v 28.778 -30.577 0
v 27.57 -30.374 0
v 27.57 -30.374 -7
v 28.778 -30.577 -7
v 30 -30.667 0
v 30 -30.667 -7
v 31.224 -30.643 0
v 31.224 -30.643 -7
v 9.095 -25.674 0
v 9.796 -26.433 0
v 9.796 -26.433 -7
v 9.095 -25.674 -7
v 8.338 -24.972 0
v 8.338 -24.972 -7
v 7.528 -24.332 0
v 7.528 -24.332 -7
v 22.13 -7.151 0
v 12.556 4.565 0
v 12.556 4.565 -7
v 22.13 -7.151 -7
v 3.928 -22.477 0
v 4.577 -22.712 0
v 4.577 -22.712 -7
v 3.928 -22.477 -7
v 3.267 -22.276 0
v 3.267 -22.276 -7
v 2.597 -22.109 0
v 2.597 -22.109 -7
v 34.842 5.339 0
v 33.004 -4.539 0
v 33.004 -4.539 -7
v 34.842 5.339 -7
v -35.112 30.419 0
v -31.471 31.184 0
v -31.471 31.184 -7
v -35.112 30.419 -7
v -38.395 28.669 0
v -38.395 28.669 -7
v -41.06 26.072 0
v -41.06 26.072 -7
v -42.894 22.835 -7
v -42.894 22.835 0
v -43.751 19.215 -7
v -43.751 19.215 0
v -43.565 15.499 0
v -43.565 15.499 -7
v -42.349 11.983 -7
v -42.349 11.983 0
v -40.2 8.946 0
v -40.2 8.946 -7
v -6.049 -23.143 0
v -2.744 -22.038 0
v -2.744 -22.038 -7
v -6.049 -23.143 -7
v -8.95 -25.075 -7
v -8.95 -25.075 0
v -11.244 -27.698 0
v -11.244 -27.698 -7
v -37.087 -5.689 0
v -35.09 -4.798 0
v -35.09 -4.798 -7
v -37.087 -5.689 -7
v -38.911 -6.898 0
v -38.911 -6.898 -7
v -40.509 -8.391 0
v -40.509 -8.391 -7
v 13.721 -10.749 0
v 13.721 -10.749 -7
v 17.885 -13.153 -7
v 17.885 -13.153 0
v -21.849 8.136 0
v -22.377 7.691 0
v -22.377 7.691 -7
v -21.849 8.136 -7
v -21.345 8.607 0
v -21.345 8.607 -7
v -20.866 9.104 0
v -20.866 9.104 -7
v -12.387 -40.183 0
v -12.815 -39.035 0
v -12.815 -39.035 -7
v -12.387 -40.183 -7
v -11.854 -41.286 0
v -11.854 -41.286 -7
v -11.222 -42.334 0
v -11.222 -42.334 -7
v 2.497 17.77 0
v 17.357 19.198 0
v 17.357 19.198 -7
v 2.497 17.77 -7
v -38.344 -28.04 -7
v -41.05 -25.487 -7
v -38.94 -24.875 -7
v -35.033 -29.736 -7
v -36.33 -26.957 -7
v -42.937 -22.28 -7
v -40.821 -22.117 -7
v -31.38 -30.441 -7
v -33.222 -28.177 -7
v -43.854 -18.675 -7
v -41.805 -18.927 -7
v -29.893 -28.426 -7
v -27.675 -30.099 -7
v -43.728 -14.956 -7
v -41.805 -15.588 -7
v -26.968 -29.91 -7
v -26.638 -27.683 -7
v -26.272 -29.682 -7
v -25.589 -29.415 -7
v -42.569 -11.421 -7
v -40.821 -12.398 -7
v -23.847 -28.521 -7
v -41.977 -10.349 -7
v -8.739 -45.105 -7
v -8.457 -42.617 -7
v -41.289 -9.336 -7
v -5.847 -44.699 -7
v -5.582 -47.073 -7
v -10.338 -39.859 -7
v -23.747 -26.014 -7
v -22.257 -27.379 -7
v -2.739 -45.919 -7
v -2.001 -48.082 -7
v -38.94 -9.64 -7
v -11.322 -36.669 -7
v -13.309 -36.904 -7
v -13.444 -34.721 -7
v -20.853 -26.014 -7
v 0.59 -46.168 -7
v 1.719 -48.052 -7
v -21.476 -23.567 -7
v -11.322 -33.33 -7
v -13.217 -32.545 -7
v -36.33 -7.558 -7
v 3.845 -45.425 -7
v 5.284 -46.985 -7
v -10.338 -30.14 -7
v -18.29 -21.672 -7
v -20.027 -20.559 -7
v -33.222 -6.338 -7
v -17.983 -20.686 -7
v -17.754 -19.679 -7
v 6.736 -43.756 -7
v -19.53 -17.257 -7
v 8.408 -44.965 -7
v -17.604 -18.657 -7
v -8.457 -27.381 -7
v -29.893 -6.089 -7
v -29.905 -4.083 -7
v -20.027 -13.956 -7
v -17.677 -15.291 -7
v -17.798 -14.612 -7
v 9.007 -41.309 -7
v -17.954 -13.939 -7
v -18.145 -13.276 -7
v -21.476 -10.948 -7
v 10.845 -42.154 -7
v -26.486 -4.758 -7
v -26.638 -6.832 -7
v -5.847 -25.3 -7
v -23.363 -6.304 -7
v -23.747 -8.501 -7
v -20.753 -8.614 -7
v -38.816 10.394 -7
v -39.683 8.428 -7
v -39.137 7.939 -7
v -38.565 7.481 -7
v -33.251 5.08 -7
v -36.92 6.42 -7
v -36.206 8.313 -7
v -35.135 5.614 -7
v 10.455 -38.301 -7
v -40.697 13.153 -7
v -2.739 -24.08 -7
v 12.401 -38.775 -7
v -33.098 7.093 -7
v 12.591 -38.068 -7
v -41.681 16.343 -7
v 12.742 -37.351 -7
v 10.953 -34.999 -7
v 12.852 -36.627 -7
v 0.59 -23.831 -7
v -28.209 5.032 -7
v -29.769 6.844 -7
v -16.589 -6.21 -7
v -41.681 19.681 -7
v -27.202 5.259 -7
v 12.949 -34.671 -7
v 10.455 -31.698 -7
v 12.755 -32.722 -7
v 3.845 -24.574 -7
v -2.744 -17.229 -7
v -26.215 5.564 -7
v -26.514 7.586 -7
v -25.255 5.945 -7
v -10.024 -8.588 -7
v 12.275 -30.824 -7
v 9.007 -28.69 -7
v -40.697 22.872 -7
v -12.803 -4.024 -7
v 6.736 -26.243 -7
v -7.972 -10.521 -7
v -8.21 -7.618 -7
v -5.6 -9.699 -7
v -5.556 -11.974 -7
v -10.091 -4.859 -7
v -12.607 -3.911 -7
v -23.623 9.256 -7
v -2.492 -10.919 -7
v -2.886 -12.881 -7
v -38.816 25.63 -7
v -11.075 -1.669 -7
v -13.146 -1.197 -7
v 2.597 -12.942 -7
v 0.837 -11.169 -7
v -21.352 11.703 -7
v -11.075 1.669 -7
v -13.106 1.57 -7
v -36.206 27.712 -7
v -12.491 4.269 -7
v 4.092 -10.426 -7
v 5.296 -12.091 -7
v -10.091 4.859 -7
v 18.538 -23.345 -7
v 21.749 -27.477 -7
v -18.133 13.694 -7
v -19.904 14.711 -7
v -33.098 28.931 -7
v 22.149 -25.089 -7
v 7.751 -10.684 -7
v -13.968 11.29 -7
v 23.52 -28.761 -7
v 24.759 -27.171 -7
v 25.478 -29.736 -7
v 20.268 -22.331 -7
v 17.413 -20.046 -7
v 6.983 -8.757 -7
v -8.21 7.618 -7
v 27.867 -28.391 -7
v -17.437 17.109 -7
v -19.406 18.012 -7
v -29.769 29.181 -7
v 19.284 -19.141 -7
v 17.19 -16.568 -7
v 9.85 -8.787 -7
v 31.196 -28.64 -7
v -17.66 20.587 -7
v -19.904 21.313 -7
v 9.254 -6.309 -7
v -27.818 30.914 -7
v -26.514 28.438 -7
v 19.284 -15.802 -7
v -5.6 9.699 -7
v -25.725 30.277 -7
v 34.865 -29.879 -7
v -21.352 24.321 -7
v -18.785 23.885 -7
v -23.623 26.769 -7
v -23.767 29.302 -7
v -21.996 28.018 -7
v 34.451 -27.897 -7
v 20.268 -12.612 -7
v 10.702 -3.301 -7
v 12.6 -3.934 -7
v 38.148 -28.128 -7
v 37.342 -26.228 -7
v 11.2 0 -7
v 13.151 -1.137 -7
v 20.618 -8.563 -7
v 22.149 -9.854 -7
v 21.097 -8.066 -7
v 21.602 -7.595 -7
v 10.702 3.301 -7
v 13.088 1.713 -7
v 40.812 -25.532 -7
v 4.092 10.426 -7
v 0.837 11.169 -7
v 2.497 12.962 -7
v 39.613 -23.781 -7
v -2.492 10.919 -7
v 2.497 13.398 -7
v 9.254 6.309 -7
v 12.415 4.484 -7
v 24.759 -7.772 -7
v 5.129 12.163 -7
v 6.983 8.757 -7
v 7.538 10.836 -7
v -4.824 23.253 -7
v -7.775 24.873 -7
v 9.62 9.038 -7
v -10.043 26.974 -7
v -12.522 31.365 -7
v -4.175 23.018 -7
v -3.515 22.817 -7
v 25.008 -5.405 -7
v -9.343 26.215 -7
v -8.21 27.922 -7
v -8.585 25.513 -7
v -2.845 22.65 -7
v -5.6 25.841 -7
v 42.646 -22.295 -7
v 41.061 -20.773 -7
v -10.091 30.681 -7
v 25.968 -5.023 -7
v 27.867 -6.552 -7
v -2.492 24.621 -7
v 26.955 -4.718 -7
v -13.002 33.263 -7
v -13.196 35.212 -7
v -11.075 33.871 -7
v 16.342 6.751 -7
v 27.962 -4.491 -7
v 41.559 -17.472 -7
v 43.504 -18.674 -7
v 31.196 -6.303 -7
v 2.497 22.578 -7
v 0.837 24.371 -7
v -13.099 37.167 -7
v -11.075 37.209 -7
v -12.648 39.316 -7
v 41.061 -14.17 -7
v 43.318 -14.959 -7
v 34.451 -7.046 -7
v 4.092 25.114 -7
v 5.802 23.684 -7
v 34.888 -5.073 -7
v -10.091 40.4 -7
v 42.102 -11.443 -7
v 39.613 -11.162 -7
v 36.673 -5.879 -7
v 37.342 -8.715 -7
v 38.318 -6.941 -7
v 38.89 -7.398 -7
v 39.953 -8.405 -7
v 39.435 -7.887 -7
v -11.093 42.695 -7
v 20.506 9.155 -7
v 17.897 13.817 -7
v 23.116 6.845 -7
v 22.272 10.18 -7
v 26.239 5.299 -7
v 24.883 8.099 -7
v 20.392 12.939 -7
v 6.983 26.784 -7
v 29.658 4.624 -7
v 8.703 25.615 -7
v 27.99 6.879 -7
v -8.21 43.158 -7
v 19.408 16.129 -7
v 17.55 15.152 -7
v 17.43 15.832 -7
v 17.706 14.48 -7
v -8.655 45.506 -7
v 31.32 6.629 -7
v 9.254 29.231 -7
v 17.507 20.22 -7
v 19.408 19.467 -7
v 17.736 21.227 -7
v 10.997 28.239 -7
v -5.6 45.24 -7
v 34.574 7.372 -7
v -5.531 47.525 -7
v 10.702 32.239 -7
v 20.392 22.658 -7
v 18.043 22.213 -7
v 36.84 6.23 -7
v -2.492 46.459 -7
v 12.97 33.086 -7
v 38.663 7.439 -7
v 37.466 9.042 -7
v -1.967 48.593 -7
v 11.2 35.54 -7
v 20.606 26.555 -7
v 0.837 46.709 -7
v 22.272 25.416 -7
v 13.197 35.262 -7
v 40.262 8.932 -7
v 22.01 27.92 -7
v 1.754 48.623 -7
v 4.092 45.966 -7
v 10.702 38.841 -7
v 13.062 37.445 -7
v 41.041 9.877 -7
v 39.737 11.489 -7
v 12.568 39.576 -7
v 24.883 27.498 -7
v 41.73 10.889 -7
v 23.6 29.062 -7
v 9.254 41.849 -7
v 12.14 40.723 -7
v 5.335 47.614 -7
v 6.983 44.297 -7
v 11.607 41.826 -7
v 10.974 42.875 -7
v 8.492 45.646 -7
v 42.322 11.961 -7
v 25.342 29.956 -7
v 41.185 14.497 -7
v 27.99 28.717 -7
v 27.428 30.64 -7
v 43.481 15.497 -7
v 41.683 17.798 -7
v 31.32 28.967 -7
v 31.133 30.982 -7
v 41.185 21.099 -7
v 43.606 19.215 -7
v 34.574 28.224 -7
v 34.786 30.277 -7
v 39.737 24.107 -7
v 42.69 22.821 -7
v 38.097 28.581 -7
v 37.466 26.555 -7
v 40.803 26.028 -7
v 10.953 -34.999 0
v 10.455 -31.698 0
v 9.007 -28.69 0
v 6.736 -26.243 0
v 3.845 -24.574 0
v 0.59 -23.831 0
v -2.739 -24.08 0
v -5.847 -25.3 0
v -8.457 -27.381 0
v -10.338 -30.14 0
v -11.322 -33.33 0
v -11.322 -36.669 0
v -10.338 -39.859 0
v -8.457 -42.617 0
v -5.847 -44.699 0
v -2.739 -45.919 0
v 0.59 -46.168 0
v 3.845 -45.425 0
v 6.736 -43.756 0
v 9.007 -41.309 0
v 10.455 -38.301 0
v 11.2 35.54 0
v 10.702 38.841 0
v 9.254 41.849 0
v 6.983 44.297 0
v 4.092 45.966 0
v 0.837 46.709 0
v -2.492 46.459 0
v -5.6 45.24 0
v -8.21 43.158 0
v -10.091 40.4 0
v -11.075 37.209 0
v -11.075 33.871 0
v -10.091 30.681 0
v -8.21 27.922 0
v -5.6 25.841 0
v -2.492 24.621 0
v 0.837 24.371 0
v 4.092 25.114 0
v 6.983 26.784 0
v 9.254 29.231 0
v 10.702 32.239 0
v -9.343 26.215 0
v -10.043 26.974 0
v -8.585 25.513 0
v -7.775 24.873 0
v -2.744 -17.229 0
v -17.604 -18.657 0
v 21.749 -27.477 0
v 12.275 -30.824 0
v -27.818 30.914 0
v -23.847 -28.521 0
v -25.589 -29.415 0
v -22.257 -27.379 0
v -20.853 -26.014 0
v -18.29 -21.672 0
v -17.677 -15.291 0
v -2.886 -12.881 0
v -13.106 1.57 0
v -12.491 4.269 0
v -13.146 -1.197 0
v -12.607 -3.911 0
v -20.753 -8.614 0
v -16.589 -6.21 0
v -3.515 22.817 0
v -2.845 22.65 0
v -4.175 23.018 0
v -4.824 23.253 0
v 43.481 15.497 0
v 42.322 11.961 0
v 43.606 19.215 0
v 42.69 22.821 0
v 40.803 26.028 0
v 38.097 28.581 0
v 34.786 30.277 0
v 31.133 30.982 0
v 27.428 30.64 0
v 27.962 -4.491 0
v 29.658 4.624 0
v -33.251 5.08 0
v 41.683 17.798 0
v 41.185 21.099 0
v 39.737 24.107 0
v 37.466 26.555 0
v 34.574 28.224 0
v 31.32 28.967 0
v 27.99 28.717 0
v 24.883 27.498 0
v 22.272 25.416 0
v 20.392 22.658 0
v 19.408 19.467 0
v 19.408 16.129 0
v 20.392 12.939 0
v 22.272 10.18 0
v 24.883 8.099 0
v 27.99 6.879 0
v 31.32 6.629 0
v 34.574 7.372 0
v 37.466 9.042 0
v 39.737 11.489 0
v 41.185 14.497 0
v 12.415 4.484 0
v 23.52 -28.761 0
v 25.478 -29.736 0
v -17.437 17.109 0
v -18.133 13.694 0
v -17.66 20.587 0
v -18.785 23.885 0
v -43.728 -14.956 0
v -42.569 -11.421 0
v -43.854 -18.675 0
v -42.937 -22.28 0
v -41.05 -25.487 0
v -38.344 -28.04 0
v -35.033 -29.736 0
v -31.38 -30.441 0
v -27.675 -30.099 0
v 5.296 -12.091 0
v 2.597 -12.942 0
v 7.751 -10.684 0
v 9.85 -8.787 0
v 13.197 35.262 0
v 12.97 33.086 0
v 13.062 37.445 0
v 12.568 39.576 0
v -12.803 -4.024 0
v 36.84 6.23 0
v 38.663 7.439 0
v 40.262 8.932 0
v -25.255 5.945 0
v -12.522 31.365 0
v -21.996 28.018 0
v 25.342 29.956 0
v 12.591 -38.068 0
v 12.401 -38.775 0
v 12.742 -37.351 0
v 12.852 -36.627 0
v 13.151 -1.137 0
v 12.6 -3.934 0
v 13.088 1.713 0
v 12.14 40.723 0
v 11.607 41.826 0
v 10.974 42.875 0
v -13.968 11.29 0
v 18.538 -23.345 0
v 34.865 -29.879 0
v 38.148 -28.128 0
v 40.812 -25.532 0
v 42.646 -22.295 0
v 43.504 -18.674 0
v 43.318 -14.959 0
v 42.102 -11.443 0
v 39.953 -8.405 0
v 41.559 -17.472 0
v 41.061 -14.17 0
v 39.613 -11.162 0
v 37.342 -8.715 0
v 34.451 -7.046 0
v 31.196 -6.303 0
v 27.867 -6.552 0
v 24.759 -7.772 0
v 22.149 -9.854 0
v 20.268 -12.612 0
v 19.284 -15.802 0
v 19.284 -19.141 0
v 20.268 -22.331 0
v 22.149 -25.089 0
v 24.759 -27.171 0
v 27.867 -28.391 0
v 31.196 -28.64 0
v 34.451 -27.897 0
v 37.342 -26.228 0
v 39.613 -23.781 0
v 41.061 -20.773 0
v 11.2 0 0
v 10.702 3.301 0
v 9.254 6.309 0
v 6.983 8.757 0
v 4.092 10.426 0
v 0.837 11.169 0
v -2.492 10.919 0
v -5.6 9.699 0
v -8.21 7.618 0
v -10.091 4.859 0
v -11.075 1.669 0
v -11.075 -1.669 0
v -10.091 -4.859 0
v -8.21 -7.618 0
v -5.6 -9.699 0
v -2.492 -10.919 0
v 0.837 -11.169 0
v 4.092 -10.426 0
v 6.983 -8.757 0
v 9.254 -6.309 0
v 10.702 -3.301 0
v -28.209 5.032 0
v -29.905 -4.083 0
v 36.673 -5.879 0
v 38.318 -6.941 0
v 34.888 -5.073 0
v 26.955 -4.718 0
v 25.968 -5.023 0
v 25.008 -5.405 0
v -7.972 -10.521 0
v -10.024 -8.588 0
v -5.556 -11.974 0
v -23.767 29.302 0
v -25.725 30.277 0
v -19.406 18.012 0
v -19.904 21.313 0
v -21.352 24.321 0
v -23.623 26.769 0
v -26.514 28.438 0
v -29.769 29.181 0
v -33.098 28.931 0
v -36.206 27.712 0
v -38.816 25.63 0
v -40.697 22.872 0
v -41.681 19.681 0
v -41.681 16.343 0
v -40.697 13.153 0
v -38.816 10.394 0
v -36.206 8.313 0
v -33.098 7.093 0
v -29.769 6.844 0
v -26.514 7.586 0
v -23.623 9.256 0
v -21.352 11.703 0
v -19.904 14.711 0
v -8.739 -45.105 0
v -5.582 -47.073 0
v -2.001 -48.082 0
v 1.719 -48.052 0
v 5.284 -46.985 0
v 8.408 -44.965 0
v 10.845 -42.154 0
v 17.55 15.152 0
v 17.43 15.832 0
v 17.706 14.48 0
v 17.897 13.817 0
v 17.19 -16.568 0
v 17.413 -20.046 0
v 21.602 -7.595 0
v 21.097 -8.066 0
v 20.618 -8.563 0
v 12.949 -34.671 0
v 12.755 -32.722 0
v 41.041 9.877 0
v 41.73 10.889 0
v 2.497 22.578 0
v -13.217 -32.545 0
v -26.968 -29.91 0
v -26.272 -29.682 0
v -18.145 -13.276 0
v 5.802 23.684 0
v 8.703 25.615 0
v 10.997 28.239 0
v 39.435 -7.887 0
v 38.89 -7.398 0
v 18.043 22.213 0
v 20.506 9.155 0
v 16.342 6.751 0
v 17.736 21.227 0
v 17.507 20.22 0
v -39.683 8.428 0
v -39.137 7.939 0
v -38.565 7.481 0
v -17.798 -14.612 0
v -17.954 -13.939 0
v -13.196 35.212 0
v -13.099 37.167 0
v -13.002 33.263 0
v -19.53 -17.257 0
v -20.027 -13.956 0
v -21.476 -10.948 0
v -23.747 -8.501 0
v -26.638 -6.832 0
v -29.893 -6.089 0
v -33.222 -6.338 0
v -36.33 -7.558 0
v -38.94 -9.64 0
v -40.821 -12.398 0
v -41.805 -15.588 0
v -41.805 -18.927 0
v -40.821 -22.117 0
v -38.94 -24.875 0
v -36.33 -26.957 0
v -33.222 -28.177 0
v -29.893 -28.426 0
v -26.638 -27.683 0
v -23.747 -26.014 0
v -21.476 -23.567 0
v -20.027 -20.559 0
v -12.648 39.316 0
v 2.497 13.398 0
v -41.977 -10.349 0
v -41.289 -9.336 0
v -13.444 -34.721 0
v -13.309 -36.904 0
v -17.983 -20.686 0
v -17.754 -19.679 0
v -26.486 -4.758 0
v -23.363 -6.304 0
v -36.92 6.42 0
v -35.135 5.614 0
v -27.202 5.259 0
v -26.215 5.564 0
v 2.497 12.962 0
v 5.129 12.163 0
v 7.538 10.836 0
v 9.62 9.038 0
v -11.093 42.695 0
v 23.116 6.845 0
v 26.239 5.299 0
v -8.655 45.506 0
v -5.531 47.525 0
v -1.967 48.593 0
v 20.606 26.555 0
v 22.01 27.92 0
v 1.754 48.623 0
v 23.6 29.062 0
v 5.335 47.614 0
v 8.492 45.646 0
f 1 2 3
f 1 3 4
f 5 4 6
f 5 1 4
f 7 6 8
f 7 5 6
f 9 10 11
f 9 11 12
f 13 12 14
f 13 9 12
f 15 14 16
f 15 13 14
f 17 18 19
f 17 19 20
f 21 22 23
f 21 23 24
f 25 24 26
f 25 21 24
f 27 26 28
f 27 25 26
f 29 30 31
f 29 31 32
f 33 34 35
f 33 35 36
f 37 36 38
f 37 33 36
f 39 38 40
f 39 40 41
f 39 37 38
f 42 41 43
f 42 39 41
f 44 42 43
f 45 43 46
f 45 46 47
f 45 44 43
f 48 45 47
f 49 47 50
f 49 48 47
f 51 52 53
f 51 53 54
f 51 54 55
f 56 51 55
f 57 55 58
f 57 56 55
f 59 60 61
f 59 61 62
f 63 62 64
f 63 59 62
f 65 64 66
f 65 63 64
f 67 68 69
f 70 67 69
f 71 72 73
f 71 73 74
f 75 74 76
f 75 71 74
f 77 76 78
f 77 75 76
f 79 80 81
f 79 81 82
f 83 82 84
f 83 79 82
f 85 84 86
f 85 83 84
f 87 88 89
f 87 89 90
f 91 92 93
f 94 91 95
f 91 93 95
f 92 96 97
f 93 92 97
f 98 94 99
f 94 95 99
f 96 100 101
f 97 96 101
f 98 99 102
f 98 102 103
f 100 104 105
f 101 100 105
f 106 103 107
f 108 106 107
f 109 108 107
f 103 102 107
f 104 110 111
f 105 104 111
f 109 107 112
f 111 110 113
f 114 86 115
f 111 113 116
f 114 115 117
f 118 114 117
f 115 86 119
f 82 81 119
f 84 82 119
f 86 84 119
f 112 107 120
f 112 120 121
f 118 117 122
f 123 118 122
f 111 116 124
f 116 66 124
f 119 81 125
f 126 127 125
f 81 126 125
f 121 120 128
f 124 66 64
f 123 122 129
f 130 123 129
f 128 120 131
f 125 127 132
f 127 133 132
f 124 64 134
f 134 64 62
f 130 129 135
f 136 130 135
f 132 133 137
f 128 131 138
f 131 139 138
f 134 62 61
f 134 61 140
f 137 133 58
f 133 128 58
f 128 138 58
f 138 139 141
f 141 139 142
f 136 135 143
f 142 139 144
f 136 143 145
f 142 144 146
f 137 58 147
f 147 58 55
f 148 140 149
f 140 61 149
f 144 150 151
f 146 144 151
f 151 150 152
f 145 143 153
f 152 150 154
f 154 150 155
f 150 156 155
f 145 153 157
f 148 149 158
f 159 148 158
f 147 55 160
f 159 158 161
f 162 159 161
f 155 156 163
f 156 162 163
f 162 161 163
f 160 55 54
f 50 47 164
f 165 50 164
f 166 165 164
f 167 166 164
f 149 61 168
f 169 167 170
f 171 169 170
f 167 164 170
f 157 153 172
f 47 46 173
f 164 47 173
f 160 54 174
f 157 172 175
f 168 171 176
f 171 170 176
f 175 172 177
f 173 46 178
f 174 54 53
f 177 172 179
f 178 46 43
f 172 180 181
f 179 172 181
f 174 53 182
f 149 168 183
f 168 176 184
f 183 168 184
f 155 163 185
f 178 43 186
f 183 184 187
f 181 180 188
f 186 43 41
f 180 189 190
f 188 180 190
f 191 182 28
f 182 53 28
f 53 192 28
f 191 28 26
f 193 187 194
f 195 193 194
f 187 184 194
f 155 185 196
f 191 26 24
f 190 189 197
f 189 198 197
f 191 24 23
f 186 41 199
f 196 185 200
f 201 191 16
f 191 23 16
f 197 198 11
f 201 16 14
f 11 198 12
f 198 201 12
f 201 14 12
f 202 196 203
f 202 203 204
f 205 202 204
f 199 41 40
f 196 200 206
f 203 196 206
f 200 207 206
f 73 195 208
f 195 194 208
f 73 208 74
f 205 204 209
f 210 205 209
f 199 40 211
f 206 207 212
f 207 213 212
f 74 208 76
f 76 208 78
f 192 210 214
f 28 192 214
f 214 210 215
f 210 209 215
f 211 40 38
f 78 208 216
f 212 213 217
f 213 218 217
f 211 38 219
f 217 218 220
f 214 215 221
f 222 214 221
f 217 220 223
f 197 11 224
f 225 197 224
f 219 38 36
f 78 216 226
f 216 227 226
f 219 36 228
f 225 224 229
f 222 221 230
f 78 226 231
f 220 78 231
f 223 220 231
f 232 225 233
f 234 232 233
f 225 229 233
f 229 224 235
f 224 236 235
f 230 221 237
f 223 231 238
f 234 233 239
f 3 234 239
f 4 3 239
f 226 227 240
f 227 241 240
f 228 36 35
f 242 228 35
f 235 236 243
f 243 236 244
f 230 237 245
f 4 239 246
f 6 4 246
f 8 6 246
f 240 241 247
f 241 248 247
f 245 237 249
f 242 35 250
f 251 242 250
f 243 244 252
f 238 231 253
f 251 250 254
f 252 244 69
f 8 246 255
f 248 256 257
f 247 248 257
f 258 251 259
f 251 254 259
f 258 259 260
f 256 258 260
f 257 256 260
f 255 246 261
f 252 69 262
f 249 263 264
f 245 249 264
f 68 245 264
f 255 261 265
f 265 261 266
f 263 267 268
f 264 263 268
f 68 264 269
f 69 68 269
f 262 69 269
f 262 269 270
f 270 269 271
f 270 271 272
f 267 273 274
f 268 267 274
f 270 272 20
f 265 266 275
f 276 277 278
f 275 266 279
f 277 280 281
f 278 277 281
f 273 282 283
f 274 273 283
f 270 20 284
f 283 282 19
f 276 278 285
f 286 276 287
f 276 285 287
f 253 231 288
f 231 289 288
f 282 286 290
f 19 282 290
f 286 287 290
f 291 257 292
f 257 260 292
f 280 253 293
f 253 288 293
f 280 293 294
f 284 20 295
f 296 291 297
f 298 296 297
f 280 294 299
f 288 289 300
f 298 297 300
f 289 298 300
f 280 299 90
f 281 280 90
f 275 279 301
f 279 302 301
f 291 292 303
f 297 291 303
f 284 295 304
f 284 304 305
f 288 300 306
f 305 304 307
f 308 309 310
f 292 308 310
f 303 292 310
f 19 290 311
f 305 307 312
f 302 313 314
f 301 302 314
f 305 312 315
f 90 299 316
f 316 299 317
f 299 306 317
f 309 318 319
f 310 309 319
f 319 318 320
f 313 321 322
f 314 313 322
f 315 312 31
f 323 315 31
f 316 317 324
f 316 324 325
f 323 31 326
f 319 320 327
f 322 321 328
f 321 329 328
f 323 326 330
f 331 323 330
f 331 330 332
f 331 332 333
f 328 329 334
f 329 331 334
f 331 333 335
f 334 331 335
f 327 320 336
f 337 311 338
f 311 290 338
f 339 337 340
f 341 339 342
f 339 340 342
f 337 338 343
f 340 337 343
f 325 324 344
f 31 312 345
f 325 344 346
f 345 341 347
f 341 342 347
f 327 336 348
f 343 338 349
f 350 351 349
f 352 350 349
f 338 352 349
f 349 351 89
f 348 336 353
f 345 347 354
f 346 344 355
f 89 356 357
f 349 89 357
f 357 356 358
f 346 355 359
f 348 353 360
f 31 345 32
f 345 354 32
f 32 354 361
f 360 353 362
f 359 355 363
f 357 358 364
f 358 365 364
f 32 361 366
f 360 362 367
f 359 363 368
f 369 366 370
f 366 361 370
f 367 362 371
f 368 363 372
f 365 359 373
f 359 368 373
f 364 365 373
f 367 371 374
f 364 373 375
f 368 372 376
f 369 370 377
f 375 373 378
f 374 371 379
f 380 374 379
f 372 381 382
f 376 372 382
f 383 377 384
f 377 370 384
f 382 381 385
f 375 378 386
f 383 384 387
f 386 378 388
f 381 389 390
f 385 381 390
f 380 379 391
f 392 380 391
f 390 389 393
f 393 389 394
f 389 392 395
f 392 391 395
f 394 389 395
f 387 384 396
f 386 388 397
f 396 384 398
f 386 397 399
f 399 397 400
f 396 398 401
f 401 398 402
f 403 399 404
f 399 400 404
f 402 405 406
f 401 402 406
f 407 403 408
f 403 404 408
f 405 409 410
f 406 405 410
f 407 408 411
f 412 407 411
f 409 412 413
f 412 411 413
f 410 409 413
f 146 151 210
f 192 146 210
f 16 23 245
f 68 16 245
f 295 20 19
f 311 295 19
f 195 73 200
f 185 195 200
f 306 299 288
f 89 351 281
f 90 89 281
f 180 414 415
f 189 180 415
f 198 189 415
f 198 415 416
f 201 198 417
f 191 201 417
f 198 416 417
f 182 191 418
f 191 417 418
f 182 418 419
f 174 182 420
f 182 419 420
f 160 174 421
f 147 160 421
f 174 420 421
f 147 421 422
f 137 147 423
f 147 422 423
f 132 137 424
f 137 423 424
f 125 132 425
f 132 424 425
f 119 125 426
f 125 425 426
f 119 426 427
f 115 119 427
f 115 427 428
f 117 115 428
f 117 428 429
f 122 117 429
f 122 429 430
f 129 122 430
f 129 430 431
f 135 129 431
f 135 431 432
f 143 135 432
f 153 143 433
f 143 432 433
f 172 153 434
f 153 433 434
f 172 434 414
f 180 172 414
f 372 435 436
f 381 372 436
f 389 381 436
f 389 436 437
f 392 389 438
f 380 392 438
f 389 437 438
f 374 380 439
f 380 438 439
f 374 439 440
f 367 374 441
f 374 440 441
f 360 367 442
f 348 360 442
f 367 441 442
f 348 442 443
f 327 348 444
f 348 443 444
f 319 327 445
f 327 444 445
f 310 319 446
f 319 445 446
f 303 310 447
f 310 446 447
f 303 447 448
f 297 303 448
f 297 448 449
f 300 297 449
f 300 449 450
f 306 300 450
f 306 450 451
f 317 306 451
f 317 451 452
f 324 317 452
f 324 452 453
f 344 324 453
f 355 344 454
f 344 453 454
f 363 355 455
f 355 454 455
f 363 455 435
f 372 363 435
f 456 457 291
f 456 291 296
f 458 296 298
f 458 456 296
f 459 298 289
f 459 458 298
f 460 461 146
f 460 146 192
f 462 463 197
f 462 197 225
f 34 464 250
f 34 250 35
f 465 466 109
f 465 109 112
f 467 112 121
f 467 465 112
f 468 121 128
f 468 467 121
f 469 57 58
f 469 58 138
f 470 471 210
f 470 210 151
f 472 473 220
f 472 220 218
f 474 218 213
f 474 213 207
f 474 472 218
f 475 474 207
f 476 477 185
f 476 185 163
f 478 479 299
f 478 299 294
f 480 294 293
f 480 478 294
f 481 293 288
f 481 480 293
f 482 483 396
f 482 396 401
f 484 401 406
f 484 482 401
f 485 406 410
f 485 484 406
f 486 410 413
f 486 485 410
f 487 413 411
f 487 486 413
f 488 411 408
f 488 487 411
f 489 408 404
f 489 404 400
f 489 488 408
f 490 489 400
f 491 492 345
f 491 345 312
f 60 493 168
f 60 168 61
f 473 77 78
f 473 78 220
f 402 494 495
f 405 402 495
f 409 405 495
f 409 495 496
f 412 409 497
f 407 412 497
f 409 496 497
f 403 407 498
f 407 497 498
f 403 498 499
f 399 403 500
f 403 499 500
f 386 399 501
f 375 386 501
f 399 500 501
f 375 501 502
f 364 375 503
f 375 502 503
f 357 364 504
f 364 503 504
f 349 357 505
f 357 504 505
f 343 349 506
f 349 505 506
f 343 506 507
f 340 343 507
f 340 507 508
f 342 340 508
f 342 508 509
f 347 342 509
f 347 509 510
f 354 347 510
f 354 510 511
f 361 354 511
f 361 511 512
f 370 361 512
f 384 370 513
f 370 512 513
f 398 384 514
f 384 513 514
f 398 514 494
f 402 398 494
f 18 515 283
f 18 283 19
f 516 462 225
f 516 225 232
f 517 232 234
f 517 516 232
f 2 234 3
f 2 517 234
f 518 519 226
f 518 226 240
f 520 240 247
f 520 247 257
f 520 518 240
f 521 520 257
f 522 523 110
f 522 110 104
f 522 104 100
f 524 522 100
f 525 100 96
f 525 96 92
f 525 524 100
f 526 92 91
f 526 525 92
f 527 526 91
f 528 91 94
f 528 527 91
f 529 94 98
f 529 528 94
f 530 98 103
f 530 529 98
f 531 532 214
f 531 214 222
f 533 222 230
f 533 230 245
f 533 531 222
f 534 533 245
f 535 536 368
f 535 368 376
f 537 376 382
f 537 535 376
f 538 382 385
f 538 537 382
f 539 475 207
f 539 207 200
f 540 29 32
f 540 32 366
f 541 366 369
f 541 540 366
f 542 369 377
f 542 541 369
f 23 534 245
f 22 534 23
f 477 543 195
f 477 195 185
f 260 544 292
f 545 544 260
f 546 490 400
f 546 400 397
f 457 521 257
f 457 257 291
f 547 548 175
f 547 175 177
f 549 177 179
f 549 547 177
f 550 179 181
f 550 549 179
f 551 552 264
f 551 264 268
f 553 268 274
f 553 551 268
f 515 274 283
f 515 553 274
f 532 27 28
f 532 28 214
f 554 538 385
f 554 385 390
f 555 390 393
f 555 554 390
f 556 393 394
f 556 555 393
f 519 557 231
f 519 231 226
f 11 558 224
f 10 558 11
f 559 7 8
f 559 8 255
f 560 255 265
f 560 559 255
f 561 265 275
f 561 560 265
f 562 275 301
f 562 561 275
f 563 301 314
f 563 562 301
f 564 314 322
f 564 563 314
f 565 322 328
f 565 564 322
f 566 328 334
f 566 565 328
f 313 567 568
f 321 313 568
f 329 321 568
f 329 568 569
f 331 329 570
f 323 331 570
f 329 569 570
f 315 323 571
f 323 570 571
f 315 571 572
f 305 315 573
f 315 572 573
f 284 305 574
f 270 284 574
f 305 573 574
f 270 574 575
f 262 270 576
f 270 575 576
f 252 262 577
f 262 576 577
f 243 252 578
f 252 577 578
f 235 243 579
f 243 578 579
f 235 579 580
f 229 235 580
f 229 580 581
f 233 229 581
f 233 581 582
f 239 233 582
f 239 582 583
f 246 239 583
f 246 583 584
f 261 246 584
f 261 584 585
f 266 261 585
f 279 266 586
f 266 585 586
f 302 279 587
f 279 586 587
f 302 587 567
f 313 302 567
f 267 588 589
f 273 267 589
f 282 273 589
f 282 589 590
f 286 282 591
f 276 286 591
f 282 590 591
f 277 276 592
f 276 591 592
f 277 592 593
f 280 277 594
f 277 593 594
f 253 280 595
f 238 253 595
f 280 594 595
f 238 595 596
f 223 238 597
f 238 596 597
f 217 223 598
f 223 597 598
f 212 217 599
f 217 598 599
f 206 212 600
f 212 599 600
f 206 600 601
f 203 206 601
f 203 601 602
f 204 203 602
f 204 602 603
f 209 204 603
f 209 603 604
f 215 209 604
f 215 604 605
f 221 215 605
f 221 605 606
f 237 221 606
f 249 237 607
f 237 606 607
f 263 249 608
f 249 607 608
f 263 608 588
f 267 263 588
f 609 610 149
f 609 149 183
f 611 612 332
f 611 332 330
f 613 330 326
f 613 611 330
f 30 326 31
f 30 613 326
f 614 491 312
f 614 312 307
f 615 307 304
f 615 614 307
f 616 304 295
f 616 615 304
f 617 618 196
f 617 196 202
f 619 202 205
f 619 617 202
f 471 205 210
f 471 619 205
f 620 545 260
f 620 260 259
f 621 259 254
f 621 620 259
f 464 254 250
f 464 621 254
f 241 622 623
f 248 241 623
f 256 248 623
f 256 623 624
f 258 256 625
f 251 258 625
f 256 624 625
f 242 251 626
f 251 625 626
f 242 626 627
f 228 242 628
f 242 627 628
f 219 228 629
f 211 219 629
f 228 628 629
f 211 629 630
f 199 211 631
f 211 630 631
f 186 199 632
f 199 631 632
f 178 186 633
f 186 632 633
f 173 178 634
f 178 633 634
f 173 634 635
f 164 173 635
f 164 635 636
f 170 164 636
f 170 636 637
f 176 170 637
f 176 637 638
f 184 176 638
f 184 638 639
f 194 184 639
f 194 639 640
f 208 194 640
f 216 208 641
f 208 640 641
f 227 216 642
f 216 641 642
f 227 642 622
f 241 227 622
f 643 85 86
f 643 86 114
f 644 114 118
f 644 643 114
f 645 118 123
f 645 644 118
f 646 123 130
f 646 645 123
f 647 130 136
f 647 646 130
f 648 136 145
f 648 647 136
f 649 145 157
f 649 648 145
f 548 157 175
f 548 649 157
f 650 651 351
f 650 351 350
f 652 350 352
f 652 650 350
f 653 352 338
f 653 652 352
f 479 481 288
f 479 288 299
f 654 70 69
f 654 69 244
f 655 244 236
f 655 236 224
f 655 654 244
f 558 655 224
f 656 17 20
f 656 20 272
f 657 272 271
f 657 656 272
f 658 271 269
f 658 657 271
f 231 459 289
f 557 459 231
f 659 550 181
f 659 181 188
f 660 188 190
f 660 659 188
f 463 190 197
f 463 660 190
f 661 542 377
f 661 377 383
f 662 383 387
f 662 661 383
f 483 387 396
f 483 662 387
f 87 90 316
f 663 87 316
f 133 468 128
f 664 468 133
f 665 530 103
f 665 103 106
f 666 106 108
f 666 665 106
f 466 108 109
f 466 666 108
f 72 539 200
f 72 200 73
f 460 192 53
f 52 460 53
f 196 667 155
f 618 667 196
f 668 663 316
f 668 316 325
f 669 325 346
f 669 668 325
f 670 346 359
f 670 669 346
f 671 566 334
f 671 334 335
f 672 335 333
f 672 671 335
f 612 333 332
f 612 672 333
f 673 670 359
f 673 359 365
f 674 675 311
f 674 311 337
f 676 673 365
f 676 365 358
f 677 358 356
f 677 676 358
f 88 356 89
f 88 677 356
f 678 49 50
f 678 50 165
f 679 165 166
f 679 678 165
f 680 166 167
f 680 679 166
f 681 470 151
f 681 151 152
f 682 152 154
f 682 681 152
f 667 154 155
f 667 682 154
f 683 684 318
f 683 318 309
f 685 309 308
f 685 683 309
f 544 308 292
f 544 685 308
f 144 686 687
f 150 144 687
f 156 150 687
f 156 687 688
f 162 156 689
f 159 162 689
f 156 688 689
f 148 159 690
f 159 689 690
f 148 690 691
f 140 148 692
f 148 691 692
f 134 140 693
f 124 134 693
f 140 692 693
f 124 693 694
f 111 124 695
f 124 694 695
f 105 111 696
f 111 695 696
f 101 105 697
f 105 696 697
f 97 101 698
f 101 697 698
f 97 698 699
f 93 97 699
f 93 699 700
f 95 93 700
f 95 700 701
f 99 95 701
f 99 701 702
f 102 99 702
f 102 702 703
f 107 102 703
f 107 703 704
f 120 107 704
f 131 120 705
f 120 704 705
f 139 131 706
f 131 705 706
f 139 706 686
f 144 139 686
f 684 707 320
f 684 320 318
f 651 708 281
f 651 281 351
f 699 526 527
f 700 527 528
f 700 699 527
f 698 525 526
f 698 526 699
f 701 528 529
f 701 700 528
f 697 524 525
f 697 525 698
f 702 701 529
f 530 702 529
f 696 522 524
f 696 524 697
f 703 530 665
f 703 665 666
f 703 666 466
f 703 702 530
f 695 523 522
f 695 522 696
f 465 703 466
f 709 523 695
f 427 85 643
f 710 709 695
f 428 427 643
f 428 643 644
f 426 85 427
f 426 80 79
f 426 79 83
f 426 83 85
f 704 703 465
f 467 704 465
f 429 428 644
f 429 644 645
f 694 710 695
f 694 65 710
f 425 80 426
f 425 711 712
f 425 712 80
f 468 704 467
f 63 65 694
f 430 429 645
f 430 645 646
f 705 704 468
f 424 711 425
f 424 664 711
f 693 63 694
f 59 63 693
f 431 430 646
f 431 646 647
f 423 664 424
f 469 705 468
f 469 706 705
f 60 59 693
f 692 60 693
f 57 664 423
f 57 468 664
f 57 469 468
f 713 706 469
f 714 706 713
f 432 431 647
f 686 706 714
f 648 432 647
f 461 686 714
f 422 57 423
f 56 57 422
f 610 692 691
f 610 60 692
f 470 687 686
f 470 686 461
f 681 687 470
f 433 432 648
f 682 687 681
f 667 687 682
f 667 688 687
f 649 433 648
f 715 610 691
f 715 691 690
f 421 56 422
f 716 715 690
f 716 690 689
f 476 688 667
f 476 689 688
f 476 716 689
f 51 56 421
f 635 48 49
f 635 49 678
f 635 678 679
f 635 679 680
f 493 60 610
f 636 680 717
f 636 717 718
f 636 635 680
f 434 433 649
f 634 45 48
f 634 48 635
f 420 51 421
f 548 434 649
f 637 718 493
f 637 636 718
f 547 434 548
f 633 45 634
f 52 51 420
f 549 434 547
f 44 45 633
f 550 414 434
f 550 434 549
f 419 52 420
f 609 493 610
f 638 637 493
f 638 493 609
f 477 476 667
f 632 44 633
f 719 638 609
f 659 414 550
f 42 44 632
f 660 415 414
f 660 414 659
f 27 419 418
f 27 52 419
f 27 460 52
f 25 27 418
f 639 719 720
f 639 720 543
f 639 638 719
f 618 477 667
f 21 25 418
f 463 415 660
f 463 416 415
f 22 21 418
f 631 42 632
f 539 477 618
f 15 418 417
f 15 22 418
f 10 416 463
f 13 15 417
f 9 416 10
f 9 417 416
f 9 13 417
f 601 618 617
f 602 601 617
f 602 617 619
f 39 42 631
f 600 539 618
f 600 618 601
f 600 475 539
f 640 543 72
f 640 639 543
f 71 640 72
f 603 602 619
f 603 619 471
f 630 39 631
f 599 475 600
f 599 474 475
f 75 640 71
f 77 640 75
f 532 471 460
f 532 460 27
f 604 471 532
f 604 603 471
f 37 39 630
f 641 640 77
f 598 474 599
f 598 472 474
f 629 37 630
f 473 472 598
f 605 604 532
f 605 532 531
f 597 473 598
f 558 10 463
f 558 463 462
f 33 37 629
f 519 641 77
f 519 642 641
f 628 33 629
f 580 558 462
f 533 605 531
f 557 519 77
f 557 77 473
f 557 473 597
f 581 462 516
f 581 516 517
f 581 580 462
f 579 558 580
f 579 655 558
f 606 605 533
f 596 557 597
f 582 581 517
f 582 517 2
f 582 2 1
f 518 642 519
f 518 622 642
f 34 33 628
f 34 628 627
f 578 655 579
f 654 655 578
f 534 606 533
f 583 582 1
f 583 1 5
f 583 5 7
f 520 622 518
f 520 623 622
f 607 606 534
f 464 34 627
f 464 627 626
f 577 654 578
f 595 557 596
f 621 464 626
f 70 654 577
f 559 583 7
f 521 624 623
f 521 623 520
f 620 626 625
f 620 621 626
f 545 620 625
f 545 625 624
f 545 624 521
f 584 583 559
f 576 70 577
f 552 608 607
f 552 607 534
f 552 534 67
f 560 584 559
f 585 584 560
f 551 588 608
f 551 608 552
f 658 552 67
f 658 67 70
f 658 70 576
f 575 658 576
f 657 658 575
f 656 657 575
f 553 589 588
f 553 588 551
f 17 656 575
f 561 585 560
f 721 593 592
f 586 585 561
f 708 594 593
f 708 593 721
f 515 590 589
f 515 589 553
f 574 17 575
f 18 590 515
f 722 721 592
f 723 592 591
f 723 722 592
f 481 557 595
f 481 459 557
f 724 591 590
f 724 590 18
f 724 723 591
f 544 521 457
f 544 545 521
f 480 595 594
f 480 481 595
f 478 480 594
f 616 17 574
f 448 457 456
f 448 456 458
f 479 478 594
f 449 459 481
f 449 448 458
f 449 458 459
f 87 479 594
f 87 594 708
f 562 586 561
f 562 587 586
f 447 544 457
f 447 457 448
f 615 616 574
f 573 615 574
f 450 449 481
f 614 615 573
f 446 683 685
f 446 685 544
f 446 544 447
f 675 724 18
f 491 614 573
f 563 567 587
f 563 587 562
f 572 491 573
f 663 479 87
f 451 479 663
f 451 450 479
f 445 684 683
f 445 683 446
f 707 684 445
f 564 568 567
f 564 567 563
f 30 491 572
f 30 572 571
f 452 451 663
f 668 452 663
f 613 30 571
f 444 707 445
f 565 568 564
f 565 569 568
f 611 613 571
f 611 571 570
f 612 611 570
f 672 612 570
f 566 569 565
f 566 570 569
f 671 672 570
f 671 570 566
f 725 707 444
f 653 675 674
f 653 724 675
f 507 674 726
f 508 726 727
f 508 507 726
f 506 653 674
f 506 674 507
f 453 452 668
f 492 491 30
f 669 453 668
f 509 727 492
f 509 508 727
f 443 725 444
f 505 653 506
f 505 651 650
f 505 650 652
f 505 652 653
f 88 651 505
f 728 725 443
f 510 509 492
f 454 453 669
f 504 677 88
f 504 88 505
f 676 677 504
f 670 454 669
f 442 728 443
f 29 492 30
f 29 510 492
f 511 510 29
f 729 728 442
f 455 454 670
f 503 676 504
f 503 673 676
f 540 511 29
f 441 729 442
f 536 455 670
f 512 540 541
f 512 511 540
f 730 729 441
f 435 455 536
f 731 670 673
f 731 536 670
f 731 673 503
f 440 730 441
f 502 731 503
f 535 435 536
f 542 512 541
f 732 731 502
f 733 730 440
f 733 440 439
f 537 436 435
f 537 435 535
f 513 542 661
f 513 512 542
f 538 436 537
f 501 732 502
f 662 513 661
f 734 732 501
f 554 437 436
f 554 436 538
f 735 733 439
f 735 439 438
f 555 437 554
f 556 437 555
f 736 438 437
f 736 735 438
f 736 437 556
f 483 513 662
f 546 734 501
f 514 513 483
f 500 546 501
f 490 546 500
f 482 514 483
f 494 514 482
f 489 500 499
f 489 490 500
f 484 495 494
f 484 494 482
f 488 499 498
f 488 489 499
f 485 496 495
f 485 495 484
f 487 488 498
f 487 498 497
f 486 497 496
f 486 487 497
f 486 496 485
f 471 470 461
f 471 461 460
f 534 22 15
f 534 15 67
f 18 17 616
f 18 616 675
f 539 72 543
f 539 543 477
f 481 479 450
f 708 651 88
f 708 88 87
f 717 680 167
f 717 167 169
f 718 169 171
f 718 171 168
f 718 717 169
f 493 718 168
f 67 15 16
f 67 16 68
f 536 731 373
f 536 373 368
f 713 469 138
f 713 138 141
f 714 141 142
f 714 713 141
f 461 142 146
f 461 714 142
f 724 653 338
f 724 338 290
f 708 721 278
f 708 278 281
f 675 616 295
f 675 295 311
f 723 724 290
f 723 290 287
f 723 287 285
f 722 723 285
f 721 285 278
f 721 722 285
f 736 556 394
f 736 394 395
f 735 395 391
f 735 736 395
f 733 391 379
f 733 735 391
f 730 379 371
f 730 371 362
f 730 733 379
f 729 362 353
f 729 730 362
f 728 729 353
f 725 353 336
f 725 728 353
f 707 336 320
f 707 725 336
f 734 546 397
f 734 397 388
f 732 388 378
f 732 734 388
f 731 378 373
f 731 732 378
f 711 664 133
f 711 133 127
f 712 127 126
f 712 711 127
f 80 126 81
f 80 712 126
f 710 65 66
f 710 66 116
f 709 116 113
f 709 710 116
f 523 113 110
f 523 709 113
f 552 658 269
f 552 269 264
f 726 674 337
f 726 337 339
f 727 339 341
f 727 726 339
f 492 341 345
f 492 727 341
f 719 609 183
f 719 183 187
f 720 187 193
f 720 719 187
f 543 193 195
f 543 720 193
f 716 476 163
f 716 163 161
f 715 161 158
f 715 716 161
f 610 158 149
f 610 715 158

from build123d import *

# Parameters (mm, degrees)
F0_R     = 11.2
F1_DEPTH = 7


with BuildPart() as f1:
    # F0 (on Top) → F1 (new body)
    with BuildSketch(Plane.XY):
        with BuildLine():
            Line((20.60563, 26.555137), (12.969892, 33.086074))
            ThreePointArc((12.969892, 33.086074), (13.174742, 36.356221), (12.567829, 39.576077))
            ThreePointArc((12.567829, 39.576077), (11.886143, 41.281075), (10.974449, 42.874979))
            ThreePointArc((10.974449, 42.874979), (-1.966663, 48.592701), (-12.648497, 39.315678))
            Line((-12.648497, 39.315678), (-13.099321, 37.167231))
            ThreePointArc((-13.099321, 37.167231), (-13.135205, 34.233743), (-12.522272, 31.364779))
            Line((-12.522272, 31.364779), (-21.996098, 28.017505))
            ThreePointArc((-21.996098, 28.017505), (-24.725703, 29.829983), (-27.817638, 30.914309))
            Line((-27.817638, 30.914309), (-31.47126, 31.183852))
            ThreePointArc((-31.47126, 31.183852), (-42.893509, 22.835381), (-40.200288, 8.94613))
            ThreePointArc((-40.200288, 8.94613), (-39.41319, 8.179754), (-38.565091, 7.481482))
            ThreePointArc((-38.565091, 7.481482), (-36.042557, 5.983661), (-33.251495, 5.079996))
            Line((-33.251495, 5.079996), (-35.089584, -4.798216))
            ThreePointArc((-35.089584, -4.798216), (-38.024038, -6.255884), (-40.509059, -8.391415))
            ThreePointArc((-40.509059, -8.391415), (-41.644788, -9.834271), (-42.569301, -11.420773))
            ThreePointArc((-42.569301, -11.420773), (-41.050438, -25.486966), (-27.675384, -30.099194))
            ThreePointArc((-27.675384, -30.099194), (-26.618133, -29.800735), (-25.589362, -29.415396))
            ThreePointArc((-25.589362, -29.415396), (-23.030945, -27.979728), (-20.852816, -26.01443))
            Line((-20.852816, -26.01443), (-13.217078, -32.545368))
            ThreePointArc((-13.217078, -32.545368), (-13.421928, -35.815514), (-12.815014, -39.035371))
            ThreePointArc((-12.815014, -39.035371), (-12.133329, -40.740369), (-11.221634, -42.334272))
            ThreePointArc((-11.221634, -42.334272), (1.719478, -48.051994), (12.401311, -38.774971))
            ThreePointArc((12.401311, -38.774971), (12.671463, -37.710136), (12.852135, -36.626524))
            ThreePointArc((12.852135, -36.626524), (12.888019, -33.693036), (12.275086, -30.824072))
            Line((12.275086, -30.824072), (21.748913, -27.476798))
            ThreePointArc((21.748913, -27.476798), (24.478517, -29.289276), (27.570452, -30.373602))
            ThreePointArc((27.570452, -30.373602), (29.387866, -30.635744), (31.224074, -30.643145))
            ThreePointArc((31.224074, -30.643145), (42.646323, -22.294675), (39.953102, -8.405424))
            ThreePointArc((39.953102, -8.405424), (39.166004, -7.639048), (38.317905, -6.940775))
            ThreePointArc((38.317905, -6.940775), (35.795371, -5.442955), (33.004309, -4.539289))
            Line((33.004309, -4.539289), (34.842398, 5.338923))
            ThreePointArc((34.842398, 5.338923), (37.776853, 6.796591), (40.261873, 8.932122))
            ThreePointArc((40.261873, 8.932122), (41.397602, 10.374978), (42.322116, 11.96148))
            ThreePointArc((42.322116, 11.96148), (40.803253, 26.027673), (27.428198, 30.639901))
            Line((27.428198, 30.639901), (25.342176, 29.956103))
            ThreePointArc((25.342176, 29.956103), (22.783759, 28.520435), (20.60563, 26.555137))
        make_face()
        with Locations((-0.247186, -34.999323)):
            Circle(F0_R, mode=Mode.SUBTRACT)
        with Locations((-30.729825, -17.25745)):
            Circle(F0_R, mode=Mode.SUBTRACT)
        with BuildLine():
            Line((-16.589028, -6.209999), (-20.753169, -8.614167))
            ThreePointArc((-20.753169, -8.614167), (-24.873356, -5.427752), (-29.905395, -4.083221))
            Line((-29.905395, -4.083221), (-28.209342, 5.031667))
            ThreePointArc((-28.209342, 5.031667), (-26.705532, 5.401733), (-25.255414, 5.945381))
            Line((-25.255414, 5.945381), (-16.589028, -6.209999))
        make_face(mode=Mode.SUBTRACT)
        with BuildLine():
            ThreePointArc((-2.744161, -22.037644), (-7.563771, -24.012623), (-11.244188, -27.698231))
            Line((-11.244188, -27.698231), (-18.289886, -21.671962))
            ThreePointArc((-18.289886, -21.671962), (-17.858467, -20.184591), (-17.604222, -18.656928))
            Line((-17.604222, -18.656928), (-2.744161, -17.229308))
            Line((-2.744161, -17.229308), (-2.744161, -22.037644))
        make_face(mode=Mode.SUBTRACT)
        with BuildLine():
            Line((-18.144567, -13.276083), (-10.024378, -8.58789))
            ThreePointArc((-10.024378, -8.58789), (-6.80271, -11.312079), (-2.886078, -12.880627))
            Line((-2.886078, -12.880627), (-17.677064, -15.291378))
            ThreePointArc((-17.677064, -15.291378), (-17.871273, -14.274558), (-18.144567, -13.276083))
        make_face(mode=Mode.SUBTRACT)
        with BuildLine():
            Line((2.597478, -22.109486), (2.597478, -12.941913))
            ThreePointArc((2.597478, -12.941913), (6.561509, -11.453672), (9.850395, -8.786907))
            Line((9.850395, -8.786907), (4.576526, -22.712264))
            ThreePointArc((4.576526, -22.712264), (3.598829, -22.372044), (2.597478, -22.109486))
        make_face(mode=Mode.SUBTRACT)
        with BuildLine():
            ThreePointArc((17.885416, -13.153124), (17.185992, -18.314518), (18.537614, -23.344657))
            Line((18.537614, -23.344657), (9.795863, -26.433276))
            ThreePointArc((9.795863, -26.433276), (8.723471, -25.315971), (7.5276, -24.331956))
            Line((7.5276, -24.331956), (13.721275, -10.748956))
            Line((13.721275, -10.748956), (17.885416, -13.153124))
        make_face(mode=Mode.SUBTRACT)
        Circle(F0_R, mode=Mode.SUBTRACT)
        with BuildLine():
            Line((20.618452, -8.56305), (12.60023, -3.933727))
            ThreePointArc((12.60023, -3.933727), (13.196812, 0.290111), (12.415187, 4.483651))
            Line((12.415187, 4.483651), (12.555742, 4.5648))
            Line((12.555742, 4.5648), (22.129997, -7.150533))
            ThreePointArc((22.129997, -7.150533), (21.34651, -7.827133), (20.618452, -8.56305))
        make_face(mode=Mode.SUBTRACT)
        with Locations((30.359046, -17.471519)):
            Circle(F0_R, mode=Mode.SUBTRACT)
        with Locations((-30.606232, 18.012226)):
            Circle(F0_R, mode=Mode.SUBTRACT)
        with BuildLine():
            Line((-20.865638, 9.103756), (-12.490782, 4.268531))
            ThreePointArc((-12.490782, 4.268531), (-13.198662, 0.187953), (-12.607263, -3.911126))
            Line((-12.607263, -3.911126), (-12.802928, -4.024093))
            Line((-12.802928, -4.024093), (-22.377183, 7.69124))
            ThreePointArc((-22.377183, 7.69124), (-21.593695, 8.36784), (-20.865638, 9.103756))
        make_face(mode=Mode.SUBTRACT)
        with BuildLine():
            ThreePointArc((-10.043049, 26.973982), (-8.970657, 25.856677), (-7.774785, 24.872663))
            Line((-7.774785, 24.872663), (-13.96846, 11.289662))
            Line((-13.96846, 11.289662), (-18.132602, 13.69383))
            ThreePointArc((-18.132602, 13.69383), (-17.433178, 18.855224), (-18.7848, 23.885364))
            Line((-18.7848, 23.885364), (-10.043049, 26.973982))
        make_face(mode=Mode.SUBTRACT)
        with BuildLine():
            Line((-4.823712, 23.252971), (-2.844664, 22.650193))
            ThreePointArc((-2.844664, 22.650193), (-3.846015, 22.912751), (-4.823712, 23.252971))
        make_face(mode=Mode.SUBTRACT)
        with BuildLine():
            Line((17.897381, 13.81679), (9.620439, 9.038095))
            ThreePointArc((9.620439, 9.038095), (6.368403, 11.562156), (2.496975, 12.961679))
            Line((2.496975, 12.961679), (2.496975, 13.398203))
            Line((2.496975, 13.398203), (17.429879, 15.832084))
            ThreePointArc((17.429879, 15.832084), (17.624087, 14.815264), (17.897381, 13.81679))
        make_face(mode=Mode.SUBTRACT)
        with BuildLine():
            ThreePointArc((2.496975, 22.578351), (7.316585, 24.553329), (10.997002, 28.238938))
            Line((10.997002, 28.238938), (18.0427, 22.212669))
            ThreePointArc((18.0427, 22.212669), (17.611282, 20.725298), (17.357036, 19.197635))
            Line((17.357036, 19.197635), (2.496975, 17.770015))
            Line((2.496975, 17.770015), (2.496975, 22.578351))
        make_face(mode=Mode.SUBTRACT)
        with BuildLine():
            Line((29.658209, 4.623928), (27.962156, -4.49096))
            ThreePointArc((27.962156, -4.49096), (26.458346, -4.861026), (25.008228, -5.404674))
            Line((25.008228, -5.404674), (16.341842, 6.750706))
            Line((16.341842, 6.750706), (20.505983, 9.154874))
            ThreePointArc((20.505983, 9.154874), (24.62617, 5.968458), (29.658209, 4.623928))
        make_face(mode=Mode.SUBTRACT)
        with Locations((30.482639, 17.798157)):
            Circle(F0_R, mode=Mode.SUBTRACT)
        with Locations((0, 35.54003)):
            Circle(F0_R, mode=Mode.SUBTRACT)
    extrude(amount=-F1_DEPTH)


solid = f1.part
